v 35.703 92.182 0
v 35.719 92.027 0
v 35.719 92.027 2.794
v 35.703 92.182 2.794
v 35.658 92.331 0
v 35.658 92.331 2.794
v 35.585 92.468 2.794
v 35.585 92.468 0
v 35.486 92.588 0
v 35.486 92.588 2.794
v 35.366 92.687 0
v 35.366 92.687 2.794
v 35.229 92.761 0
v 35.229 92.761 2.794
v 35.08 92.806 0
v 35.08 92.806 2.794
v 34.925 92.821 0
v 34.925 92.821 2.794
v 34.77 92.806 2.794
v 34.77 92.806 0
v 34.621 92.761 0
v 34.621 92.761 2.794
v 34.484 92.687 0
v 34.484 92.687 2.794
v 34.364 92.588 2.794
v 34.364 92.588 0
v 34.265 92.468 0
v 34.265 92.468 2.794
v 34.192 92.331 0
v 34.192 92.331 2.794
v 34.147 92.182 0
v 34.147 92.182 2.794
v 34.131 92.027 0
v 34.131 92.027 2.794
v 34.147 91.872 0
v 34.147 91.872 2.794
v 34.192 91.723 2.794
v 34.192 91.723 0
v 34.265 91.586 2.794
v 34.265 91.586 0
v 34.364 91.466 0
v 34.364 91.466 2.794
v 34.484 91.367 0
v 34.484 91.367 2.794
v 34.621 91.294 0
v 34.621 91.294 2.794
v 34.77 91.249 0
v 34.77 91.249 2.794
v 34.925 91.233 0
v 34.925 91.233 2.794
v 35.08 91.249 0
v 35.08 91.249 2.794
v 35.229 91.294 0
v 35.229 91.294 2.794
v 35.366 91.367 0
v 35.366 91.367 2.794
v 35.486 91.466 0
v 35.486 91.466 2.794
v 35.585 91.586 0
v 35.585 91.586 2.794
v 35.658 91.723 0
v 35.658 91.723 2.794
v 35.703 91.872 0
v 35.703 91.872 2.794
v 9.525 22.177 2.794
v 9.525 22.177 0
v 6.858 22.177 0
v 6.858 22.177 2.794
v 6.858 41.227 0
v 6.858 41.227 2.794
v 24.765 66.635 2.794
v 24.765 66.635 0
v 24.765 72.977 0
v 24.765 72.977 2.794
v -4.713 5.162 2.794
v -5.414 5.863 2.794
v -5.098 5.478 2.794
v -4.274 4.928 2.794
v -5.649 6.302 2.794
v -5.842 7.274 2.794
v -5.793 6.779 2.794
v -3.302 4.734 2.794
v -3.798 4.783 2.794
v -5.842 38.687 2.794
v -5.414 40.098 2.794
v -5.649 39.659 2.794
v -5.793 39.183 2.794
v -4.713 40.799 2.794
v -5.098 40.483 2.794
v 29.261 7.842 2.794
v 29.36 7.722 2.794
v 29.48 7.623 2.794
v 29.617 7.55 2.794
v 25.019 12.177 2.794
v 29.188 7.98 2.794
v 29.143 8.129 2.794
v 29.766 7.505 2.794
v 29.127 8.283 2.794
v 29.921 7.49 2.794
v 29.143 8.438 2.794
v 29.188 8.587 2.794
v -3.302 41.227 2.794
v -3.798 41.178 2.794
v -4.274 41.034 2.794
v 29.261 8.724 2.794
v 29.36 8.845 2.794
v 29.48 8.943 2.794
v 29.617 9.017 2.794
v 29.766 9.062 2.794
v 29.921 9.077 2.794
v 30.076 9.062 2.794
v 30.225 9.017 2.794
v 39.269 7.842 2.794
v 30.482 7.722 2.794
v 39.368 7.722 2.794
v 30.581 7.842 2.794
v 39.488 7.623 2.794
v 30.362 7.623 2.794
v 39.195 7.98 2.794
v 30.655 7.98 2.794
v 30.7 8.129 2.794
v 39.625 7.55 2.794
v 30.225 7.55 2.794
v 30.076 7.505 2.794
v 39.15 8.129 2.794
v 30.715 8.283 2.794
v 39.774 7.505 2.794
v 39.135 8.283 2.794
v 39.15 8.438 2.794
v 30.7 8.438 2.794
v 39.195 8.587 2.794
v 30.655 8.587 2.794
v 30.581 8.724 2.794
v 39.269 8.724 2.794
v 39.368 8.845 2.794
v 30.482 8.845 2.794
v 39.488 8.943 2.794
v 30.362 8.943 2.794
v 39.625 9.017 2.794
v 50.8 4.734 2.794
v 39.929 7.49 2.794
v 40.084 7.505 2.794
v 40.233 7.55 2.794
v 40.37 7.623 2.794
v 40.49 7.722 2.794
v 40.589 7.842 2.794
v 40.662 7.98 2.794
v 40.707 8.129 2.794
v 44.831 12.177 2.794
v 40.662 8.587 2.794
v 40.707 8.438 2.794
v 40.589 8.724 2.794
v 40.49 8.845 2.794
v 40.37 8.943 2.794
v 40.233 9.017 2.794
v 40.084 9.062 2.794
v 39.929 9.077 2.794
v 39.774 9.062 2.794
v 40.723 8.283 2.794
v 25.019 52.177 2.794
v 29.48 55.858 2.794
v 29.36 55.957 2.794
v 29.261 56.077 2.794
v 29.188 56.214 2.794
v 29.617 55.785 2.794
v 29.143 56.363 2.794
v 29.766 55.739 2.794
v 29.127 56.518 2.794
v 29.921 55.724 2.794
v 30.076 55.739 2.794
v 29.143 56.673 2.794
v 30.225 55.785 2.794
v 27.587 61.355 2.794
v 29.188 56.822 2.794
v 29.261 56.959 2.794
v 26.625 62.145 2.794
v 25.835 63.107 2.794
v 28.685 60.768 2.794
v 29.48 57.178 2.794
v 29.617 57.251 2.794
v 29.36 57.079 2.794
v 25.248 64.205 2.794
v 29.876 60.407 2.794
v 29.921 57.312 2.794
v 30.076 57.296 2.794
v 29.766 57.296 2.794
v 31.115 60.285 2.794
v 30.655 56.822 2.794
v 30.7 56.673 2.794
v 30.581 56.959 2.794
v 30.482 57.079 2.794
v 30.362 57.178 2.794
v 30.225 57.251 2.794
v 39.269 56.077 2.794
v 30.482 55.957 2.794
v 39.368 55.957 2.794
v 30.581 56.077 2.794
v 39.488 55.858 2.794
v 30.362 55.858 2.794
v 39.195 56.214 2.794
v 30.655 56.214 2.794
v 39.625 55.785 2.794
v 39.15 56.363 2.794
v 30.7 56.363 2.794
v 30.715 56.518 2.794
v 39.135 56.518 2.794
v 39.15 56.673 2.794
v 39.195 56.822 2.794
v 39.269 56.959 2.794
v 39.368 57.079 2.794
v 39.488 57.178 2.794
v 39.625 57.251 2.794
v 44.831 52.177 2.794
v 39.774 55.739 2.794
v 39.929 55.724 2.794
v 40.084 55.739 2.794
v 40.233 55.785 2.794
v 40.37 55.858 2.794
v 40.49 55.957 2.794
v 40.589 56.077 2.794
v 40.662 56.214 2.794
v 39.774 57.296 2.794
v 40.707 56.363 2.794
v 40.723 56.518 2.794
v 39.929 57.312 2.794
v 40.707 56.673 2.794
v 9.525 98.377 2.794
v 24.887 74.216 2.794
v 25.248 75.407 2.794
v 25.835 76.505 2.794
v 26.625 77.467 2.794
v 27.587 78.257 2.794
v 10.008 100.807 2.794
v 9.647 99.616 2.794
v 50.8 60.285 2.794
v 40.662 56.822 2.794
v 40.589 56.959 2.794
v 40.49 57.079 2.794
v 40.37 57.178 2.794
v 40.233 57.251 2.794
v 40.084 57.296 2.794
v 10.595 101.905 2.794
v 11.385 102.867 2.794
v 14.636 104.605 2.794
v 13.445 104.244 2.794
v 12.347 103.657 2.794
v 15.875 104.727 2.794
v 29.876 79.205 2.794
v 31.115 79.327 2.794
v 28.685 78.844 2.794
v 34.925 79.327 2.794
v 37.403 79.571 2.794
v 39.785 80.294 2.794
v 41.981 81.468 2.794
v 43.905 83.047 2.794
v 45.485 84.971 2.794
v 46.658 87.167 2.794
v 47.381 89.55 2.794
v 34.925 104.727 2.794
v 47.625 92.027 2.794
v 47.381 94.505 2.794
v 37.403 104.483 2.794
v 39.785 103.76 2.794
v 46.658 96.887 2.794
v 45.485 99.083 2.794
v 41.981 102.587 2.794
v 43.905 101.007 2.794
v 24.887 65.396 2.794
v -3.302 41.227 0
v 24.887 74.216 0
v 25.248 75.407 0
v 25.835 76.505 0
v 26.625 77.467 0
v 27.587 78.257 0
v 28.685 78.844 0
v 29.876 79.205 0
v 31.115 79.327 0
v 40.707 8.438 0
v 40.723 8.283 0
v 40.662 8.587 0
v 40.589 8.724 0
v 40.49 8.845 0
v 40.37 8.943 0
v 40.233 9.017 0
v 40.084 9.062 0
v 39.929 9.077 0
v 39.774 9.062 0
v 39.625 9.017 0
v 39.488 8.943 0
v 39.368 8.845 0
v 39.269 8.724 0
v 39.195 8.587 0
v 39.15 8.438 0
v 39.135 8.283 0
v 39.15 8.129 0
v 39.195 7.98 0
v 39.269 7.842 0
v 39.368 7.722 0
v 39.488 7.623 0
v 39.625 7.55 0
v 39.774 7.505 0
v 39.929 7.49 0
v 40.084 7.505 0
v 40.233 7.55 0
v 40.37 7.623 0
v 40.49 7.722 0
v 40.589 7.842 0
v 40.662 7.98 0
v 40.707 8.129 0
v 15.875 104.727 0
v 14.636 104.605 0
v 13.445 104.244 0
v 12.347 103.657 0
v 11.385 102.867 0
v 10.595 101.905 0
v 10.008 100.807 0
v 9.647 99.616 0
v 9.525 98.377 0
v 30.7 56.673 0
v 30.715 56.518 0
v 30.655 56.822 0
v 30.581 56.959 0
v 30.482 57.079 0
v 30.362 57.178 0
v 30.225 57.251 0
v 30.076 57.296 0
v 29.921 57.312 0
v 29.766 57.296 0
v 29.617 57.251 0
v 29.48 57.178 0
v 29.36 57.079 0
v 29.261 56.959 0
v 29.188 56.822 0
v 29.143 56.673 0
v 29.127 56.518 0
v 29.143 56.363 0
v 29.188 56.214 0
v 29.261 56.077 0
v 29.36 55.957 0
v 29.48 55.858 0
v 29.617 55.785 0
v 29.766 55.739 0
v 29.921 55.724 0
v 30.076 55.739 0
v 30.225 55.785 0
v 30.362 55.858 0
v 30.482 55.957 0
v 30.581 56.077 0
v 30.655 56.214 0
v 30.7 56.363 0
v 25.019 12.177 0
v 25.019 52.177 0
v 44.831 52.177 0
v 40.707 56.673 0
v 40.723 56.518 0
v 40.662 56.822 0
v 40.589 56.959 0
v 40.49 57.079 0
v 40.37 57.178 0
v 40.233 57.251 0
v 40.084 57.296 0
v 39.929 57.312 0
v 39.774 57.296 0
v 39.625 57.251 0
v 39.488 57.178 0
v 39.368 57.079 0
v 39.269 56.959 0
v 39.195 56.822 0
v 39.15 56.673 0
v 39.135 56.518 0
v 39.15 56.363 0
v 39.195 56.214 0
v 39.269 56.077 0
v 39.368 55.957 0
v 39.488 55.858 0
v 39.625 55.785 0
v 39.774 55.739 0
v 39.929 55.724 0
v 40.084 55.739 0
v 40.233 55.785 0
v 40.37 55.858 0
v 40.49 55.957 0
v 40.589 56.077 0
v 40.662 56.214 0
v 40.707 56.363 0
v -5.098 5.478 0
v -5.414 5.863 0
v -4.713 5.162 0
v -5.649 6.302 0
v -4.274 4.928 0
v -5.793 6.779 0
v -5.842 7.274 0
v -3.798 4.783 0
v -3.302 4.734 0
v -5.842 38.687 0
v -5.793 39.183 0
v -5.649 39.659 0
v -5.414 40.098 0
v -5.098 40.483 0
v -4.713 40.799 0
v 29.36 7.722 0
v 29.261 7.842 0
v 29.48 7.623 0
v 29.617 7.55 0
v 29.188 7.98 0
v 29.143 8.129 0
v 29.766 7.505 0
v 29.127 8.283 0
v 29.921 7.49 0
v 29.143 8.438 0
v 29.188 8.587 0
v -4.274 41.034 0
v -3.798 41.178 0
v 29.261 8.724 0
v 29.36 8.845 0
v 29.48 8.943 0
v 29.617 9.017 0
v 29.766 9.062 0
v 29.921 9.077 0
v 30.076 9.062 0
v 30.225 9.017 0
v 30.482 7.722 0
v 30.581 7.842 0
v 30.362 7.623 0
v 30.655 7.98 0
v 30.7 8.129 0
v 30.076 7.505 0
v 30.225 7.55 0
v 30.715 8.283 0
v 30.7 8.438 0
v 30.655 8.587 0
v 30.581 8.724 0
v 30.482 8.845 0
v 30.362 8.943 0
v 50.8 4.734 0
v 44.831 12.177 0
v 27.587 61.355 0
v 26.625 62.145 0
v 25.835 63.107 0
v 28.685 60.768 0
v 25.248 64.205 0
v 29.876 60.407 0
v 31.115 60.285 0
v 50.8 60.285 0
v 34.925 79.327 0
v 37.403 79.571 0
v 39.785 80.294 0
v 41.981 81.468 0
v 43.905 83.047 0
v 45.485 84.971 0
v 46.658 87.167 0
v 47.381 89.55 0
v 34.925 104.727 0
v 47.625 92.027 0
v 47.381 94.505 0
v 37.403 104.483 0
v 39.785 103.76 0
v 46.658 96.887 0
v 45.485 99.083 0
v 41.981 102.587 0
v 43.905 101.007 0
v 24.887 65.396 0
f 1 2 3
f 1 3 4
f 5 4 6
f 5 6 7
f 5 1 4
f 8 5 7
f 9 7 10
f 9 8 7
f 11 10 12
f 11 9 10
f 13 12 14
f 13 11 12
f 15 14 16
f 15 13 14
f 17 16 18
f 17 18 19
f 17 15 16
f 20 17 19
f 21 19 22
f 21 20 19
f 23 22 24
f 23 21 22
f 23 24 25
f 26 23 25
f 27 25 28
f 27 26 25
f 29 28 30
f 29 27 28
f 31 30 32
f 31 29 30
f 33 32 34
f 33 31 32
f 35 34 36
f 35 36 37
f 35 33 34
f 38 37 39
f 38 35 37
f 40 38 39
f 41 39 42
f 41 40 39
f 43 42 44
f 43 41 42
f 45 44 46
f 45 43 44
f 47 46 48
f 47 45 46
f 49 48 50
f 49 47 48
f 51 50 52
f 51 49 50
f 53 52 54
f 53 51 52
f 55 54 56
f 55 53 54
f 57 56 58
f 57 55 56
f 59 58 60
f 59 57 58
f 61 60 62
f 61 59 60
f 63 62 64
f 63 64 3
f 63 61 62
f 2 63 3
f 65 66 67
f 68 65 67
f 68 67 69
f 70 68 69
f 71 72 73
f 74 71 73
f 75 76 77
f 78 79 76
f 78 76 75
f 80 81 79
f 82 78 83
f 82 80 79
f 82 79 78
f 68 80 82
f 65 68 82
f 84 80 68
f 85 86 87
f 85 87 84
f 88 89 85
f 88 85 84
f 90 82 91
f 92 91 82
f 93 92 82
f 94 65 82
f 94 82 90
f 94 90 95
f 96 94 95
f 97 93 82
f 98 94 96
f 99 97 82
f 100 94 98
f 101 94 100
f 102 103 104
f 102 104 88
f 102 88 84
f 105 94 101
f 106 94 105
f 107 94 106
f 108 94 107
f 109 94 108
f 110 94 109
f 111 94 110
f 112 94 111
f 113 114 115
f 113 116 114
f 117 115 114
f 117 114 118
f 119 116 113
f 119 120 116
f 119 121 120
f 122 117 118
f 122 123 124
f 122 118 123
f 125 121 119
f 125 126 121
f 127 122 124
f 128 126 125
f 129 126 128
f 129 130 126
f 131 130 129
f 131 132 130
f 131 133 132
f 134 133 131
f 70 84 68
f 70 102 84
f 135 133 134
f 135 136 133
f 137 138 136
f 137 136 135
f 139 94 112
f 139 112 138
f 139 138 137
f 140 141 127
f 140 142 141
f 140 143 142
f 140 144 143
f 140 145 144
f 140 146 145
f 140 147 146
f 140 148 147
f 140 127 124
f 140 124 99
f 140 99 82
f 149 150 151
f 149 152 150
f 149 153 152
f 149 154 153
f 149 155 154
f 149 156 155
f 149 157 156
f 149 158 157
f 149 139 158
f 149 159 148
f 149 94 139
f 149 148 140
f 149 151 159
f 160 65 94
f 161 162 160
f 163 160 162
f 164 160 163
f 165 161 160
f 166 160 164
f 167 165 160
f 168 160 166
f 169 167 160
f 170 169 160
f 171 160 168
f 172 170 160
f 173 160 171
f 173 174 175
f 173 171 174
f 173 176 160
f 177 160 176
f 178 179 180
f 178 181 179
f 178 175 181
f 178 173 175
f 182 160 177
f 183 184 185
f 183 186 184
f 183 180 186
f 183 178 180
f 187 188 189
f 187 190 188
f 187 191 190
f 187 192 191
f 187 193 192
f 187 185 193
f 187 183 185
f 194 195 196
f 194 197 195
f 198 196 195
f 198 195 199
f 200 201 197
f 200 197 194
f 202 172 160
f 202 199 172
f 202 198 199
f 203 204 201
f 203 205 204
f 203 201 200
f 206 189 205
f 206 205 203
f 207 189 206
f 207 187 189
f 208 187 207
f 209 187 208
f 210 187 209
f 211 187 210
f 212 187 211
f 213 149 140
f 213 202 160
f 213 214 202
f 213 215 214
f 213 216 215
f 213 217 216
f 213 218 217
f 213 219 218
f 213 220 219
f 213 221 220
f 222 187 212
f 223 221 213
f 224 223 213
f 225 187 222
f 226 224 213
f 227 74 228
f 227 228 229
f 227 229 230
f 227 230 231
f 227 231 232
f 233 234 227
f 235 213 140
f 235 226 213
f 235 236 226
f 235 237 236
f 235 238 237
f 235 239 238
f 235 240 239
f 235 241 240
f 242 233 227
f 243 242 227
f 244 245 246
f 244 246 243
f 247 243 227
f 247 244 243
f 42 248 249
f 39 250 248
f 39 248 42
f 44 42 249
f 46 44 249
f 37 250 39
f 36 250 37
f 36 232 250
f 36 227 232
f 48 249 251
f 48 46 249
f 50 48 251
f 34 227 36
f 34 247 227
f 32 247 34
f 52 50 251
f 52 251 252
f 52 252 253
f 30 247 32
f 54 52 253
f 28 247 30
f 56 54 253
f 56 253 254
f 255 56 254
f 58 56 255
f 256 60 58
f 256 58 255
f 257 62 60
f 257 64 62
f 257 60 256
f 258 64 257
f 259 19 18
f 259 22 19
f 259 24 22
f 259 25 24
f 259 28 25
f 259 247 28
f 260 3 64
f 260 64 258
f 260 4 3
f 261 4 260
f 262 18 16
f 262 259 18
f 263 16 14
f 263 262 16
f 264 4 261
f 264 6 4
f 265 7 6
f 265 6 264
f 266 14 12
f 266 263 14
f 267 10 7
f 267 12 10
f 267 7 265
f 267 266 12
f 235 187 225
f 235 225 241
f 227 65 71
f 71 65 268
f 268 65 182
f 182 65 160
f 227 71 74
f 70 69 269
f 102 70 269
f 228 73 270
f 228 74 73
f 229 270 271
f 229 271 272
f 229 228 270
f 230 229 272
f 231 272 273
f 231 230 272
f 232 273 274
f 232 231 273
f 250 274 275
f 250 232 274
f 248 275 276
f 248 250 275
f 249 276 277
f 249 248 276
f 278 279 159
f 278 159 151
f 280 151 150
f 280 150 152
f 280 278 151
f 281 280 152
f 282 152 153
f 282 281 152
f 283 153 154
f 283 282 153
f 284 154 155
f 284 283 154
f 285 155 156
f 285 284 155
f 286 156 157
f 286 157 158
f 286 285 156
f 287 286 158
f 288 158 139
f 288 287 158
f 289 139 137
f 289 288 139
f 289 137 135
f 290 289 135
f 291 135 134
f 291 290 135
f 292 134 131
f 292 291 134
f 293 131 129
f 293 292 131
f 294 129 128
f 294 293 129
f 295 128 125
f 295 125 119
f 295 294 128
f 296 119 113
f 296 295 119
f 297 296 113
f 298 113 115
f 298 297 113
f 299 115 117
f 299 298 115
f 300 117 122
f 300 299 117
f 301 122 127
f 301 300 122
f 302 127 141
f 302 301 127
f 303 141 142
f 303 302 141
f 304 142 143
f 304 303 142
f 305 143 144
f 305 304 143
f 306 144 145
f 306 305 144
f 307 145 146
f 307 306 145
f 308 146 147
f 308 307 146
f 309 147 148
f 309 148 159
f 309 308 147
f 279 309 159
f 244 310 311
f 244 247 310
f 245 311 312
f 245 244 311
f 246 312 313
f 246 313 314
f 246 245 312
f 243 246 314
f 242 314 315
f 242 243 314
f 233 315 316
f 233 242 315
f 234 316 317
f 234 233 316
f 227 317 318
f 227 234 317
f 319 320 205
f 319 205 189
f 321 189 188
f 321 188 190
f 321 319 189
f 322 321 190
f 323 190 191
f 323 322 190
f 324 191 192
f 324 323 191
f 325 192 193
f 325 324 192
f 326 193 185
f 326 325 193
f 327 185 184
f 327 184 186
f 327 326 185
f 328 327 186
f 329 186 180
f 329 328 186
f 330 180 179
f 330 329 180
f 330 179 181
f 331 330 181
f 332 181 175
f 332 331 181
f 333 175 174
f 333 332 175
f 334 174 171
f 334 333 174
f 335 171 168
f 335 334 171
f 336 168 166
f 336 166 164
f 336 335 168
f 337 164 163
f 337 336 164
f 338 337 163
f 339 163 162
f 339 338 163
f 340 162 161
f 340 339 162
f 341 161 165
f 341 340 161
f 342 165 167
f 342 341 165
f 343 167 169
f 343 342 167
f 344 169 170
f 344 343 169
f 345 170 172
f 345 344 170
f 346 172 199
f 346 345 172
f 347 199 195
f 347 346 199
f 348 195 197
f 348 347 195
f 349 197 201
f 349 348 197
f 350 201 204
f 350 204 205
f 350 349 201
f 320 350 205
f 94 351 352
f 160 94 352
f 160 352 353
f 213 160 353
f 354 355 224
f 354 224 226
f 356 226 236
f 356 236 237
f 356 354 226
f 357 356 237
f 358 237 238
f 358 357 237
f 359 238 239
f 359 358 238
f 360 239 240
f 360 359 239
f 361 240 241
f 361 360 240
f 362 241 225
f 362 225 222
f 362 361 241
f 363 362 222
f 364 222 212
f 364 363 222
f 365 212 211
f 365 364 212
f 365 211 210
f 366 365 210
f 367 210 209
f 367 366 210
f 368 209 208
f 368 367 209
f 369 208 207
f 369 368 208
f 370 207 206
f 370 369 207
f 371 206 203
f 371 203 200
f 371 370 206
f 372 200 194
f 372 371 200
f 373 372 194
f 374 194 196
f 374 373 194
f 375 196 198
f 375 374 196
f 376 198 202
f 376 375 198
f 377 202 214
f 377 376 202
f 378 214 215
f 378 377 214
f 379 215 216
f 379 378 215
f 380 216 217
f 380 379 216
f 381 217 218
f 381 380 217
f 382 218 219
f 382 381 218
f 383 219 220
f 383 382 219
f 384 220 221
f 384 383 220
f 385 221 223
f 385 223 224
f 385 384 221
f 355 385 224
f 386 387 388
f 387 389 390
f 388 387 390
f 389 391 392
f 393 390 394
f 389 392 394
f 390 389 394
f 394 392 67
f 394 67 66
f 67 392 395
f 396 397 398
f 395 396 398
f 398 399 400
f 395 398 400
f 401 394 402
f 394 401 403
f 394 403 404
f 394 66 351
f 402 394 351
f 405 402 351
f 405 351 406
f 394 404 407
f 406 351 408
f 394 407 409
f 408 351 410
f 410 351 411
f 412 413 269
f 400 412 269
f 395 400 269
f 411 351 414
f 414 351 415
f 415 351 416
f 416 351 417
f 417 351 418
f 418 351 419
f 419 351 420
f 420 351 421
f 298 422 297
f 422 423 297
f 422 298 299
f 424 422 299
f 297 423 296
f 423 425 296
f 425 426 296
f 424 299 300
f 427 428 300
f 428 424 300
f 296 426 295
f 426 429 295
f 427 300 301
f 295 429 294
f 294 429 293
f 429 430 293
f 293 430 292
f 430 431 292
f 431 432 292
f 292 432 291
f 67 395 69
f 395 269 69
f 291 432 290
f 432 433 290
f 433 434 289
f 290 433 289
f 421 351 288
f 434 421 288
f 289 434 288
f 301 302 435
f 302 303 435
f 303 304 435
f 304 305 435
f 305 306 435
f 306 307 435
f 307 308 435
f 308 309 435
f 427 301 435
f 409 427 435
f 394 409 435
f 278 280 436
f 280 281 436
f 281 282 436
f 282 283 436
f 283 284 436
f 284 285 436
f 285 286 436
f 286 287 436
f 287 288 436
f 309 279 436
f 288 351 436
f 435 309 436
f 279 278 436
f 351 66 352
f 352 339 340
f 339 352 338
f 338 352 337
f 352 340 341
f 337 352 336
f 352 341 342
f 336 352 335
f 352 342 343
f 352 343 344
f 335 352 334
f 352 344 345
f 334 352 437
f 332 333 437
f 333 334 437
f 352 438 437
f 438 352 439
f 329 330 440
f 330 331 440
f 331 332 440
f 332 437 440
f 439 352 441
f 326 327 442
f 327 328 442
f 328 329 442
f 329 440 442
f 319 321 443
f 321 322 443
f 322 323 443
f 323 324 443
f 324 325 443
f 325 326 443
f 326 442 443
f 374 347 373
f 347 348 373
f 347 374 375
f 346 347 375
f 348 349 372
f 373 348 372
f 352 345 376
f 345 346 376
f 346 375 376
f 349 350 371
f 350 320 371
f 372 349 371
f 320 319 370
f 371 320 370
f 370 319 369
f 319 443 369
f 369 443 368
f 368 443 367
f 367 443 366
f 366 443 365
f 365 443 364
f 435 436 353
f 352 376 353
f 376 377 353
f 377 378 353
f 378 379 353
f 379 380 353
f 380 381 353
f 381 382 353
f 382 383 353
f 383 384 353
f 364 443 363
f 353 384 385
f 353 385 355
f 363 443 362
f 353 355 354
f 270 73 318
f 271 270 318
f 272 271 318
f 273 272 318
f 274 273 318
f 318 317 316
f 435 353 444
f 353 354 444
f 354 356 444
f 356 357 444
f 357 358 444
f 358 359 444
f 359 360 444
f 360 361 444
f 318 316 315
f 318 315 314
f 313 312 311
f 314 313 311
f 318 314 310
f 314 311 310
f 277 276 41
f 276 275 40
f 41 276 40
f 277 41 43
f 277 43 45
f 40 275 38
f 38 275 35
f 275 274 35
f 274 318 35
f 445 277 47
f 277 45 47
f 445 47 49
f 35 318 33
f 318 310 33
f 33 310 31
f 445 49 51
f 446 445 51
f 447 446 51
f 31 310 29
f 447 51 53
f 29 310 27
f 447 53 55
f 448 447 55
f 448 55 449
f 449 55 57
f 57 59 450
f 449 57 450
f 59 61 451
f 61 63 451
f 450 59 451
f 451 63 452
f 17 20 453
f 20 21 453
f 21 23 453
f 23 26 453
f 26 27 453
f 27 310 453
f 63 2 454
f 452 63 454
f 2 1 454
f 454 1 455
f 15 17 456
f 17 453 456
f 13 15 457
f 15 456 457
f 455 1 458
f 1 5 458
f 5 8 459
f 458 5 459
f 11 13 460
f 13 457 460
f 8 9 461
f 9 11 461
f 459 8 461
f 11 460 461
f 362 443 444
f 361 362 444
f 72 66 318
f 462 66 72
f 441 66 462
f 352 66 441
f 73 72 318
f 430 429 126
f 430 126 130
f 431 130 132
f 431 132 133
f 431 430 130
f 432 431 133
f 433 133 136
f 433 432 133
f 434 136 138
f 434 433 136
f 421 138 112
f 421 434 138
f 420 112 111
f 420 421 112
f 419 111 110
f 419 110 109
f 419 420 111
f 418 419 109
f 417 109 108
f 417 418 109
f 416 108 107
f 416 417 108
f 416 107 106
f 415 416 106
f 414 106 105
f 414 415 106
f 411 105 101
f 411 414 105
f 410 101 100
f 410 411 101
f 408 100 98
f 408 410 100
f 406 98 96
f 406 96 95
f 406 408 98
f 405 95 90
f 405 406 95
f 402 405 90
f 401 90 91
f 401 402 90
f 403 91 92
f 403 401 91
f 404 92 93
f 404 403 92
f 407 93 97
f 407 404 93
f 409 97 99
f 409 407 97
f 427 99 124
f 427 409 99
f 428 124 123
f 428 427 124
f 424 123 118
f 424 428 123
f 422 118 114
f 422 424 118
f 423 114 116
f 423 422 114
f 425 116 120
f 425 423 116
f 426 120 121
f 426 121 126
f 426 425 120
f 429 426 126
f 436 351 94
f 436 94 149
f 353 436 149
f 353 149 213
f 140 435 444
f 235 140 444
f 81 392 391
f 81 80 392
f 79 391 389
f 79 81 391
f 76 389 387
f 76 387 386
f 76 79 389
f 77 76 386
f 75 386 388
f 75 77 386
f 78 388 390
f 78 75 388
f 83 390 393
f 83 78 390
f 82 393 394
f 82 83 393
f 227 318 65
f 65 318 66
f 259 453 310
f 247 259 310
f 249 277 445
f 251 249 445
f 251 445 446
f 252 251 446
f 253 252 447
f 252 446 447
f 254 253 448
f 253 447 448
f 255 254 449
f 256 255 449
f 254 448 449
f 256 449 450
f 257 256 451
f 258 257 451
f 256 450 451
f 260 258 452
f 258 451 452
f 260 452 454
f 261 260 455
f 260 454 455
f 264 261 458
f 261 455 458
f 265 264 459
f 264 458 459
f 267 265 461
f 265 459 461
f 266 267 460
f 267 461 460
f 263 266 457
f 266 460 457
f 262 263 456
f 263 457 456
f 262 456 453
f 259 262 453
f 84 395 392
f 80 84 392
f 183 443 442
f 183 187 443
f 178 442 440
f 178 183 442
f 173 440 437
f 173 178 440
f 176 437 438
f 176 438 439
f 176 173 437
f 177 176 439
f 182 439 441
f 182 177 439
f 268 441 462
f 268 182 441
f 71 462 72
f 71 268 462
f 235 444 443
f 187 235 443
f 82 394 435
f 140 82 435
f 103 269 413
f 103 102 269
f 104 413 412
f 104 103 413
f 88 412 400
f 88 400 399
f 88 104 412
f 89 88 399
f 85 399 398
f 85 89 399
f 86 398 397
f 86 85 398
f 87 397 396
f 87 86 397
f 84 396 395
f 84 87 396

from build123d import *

# Parameters (mm, degrees)
SKETCH1_R           = 0.79375
SKETCH1_W           = 19.812
SKETCH1_H           = 40
BOSS_EXTRUDE1_DEPTH = 2.794
FILLET1_R           = 6.35
FILLET2_R           = 6.35
FILLET5_R           = 2.54


with BuildPart() as part:
    # Sketch1 → Boss-Extrude1 (new body)
    with BuildSketch(Plane.XY):
        with BuildLine():
            Line((-5.842, 4.734159763), (50.8, 4.734159763))
            Line((50.8, 4.734159763), (50.8, 36.343152622))
            Line((50.8, 36.343152622), (50.8, 60.284785263))
            Line((50.8, 60.284785263), (24.765, 60.284785263))
            Line((24.765, 60.284785263), (24.765, 79.327185263))
            Line((24.765, 79.327185263), (34.925, 79.327185263))
            ThreePointArc((34.925, 79.327185263), (47.625, 92.027185263), (34.925, 104.727185263))
            Line((34.925, 104.727185263), (9.525, 104.727185263))
            Line((9.525, 104.727185263), (9.525, 38.1))
            Line((9.525, 38.1), (9.525, 22.177185263))
            Line((9.525, 22.177185263), (6.858, 22.177185263))
            Line((6.858, 22.177185263), (6.858, 41.227185263))
            Line((6.858, 41.227185263), (-5.842, 41.227185263))
            Line((-5.842, 41.227185263), (-5.842, 4.734159763))
        make_face()
        with Locations((34.925, 92.027185263)):
            Circle(SKETCH1_R, mode=Mode.SUBTRACT)
        with Locations((29.9212, 8.283385263)):
            Circle(SKETCH1_R, mode=Mode.SUBTRACT)
        with Locations((39.9288, 8.283385263)):
            Circle(SKETCH1_R, mode=Mode.SUBTRACT)
        with Locations((29.9212, 56.517985263)):
            Circle(SKETCH1_R, mode=Mode.SUBTRACT)
        with Locations((39.9288, 56.517985263)):
            Circle(SKETCH1_R, mode=Mode.SUBTRACT)
        with Locations((34.925, 32.177185263)):
            Rectangle(SKETCH1_W, SKETCH1_H, mode=Mode.SUBTRACT)
    extrude(amount=BOSS_EXTRUDE1_DEPTH)

    # Fillet1
    fillet1_edges = [part.edges().sort_by_distance(p)[0] for p in [
        (24.765, 79.327185263, 1.397),
        (24.765, 60.284785263, 1.397),
    ]]
    fillet(fillet1_edges, radius=FILLET1_R)

    # Fillet2
    fillet2_edges = [part.edges().sort_by_distance(p)[0] for p in [
        (9.525, 104.727185263, 1.397),
    ]]
    fillet(fillet2_edges, radius=FILLET2_R)

    # Fillet5
    fillet5_edges = [part.edges().sort_by_distance(p)[0] for p in [
        (-5.842, 4.734159763, 1.397),
        (-5.842, 41.227185263, 1.397),
    ]]
    fillet(fillet5_edges, radius=FILLET5_R)


solid = part.part
